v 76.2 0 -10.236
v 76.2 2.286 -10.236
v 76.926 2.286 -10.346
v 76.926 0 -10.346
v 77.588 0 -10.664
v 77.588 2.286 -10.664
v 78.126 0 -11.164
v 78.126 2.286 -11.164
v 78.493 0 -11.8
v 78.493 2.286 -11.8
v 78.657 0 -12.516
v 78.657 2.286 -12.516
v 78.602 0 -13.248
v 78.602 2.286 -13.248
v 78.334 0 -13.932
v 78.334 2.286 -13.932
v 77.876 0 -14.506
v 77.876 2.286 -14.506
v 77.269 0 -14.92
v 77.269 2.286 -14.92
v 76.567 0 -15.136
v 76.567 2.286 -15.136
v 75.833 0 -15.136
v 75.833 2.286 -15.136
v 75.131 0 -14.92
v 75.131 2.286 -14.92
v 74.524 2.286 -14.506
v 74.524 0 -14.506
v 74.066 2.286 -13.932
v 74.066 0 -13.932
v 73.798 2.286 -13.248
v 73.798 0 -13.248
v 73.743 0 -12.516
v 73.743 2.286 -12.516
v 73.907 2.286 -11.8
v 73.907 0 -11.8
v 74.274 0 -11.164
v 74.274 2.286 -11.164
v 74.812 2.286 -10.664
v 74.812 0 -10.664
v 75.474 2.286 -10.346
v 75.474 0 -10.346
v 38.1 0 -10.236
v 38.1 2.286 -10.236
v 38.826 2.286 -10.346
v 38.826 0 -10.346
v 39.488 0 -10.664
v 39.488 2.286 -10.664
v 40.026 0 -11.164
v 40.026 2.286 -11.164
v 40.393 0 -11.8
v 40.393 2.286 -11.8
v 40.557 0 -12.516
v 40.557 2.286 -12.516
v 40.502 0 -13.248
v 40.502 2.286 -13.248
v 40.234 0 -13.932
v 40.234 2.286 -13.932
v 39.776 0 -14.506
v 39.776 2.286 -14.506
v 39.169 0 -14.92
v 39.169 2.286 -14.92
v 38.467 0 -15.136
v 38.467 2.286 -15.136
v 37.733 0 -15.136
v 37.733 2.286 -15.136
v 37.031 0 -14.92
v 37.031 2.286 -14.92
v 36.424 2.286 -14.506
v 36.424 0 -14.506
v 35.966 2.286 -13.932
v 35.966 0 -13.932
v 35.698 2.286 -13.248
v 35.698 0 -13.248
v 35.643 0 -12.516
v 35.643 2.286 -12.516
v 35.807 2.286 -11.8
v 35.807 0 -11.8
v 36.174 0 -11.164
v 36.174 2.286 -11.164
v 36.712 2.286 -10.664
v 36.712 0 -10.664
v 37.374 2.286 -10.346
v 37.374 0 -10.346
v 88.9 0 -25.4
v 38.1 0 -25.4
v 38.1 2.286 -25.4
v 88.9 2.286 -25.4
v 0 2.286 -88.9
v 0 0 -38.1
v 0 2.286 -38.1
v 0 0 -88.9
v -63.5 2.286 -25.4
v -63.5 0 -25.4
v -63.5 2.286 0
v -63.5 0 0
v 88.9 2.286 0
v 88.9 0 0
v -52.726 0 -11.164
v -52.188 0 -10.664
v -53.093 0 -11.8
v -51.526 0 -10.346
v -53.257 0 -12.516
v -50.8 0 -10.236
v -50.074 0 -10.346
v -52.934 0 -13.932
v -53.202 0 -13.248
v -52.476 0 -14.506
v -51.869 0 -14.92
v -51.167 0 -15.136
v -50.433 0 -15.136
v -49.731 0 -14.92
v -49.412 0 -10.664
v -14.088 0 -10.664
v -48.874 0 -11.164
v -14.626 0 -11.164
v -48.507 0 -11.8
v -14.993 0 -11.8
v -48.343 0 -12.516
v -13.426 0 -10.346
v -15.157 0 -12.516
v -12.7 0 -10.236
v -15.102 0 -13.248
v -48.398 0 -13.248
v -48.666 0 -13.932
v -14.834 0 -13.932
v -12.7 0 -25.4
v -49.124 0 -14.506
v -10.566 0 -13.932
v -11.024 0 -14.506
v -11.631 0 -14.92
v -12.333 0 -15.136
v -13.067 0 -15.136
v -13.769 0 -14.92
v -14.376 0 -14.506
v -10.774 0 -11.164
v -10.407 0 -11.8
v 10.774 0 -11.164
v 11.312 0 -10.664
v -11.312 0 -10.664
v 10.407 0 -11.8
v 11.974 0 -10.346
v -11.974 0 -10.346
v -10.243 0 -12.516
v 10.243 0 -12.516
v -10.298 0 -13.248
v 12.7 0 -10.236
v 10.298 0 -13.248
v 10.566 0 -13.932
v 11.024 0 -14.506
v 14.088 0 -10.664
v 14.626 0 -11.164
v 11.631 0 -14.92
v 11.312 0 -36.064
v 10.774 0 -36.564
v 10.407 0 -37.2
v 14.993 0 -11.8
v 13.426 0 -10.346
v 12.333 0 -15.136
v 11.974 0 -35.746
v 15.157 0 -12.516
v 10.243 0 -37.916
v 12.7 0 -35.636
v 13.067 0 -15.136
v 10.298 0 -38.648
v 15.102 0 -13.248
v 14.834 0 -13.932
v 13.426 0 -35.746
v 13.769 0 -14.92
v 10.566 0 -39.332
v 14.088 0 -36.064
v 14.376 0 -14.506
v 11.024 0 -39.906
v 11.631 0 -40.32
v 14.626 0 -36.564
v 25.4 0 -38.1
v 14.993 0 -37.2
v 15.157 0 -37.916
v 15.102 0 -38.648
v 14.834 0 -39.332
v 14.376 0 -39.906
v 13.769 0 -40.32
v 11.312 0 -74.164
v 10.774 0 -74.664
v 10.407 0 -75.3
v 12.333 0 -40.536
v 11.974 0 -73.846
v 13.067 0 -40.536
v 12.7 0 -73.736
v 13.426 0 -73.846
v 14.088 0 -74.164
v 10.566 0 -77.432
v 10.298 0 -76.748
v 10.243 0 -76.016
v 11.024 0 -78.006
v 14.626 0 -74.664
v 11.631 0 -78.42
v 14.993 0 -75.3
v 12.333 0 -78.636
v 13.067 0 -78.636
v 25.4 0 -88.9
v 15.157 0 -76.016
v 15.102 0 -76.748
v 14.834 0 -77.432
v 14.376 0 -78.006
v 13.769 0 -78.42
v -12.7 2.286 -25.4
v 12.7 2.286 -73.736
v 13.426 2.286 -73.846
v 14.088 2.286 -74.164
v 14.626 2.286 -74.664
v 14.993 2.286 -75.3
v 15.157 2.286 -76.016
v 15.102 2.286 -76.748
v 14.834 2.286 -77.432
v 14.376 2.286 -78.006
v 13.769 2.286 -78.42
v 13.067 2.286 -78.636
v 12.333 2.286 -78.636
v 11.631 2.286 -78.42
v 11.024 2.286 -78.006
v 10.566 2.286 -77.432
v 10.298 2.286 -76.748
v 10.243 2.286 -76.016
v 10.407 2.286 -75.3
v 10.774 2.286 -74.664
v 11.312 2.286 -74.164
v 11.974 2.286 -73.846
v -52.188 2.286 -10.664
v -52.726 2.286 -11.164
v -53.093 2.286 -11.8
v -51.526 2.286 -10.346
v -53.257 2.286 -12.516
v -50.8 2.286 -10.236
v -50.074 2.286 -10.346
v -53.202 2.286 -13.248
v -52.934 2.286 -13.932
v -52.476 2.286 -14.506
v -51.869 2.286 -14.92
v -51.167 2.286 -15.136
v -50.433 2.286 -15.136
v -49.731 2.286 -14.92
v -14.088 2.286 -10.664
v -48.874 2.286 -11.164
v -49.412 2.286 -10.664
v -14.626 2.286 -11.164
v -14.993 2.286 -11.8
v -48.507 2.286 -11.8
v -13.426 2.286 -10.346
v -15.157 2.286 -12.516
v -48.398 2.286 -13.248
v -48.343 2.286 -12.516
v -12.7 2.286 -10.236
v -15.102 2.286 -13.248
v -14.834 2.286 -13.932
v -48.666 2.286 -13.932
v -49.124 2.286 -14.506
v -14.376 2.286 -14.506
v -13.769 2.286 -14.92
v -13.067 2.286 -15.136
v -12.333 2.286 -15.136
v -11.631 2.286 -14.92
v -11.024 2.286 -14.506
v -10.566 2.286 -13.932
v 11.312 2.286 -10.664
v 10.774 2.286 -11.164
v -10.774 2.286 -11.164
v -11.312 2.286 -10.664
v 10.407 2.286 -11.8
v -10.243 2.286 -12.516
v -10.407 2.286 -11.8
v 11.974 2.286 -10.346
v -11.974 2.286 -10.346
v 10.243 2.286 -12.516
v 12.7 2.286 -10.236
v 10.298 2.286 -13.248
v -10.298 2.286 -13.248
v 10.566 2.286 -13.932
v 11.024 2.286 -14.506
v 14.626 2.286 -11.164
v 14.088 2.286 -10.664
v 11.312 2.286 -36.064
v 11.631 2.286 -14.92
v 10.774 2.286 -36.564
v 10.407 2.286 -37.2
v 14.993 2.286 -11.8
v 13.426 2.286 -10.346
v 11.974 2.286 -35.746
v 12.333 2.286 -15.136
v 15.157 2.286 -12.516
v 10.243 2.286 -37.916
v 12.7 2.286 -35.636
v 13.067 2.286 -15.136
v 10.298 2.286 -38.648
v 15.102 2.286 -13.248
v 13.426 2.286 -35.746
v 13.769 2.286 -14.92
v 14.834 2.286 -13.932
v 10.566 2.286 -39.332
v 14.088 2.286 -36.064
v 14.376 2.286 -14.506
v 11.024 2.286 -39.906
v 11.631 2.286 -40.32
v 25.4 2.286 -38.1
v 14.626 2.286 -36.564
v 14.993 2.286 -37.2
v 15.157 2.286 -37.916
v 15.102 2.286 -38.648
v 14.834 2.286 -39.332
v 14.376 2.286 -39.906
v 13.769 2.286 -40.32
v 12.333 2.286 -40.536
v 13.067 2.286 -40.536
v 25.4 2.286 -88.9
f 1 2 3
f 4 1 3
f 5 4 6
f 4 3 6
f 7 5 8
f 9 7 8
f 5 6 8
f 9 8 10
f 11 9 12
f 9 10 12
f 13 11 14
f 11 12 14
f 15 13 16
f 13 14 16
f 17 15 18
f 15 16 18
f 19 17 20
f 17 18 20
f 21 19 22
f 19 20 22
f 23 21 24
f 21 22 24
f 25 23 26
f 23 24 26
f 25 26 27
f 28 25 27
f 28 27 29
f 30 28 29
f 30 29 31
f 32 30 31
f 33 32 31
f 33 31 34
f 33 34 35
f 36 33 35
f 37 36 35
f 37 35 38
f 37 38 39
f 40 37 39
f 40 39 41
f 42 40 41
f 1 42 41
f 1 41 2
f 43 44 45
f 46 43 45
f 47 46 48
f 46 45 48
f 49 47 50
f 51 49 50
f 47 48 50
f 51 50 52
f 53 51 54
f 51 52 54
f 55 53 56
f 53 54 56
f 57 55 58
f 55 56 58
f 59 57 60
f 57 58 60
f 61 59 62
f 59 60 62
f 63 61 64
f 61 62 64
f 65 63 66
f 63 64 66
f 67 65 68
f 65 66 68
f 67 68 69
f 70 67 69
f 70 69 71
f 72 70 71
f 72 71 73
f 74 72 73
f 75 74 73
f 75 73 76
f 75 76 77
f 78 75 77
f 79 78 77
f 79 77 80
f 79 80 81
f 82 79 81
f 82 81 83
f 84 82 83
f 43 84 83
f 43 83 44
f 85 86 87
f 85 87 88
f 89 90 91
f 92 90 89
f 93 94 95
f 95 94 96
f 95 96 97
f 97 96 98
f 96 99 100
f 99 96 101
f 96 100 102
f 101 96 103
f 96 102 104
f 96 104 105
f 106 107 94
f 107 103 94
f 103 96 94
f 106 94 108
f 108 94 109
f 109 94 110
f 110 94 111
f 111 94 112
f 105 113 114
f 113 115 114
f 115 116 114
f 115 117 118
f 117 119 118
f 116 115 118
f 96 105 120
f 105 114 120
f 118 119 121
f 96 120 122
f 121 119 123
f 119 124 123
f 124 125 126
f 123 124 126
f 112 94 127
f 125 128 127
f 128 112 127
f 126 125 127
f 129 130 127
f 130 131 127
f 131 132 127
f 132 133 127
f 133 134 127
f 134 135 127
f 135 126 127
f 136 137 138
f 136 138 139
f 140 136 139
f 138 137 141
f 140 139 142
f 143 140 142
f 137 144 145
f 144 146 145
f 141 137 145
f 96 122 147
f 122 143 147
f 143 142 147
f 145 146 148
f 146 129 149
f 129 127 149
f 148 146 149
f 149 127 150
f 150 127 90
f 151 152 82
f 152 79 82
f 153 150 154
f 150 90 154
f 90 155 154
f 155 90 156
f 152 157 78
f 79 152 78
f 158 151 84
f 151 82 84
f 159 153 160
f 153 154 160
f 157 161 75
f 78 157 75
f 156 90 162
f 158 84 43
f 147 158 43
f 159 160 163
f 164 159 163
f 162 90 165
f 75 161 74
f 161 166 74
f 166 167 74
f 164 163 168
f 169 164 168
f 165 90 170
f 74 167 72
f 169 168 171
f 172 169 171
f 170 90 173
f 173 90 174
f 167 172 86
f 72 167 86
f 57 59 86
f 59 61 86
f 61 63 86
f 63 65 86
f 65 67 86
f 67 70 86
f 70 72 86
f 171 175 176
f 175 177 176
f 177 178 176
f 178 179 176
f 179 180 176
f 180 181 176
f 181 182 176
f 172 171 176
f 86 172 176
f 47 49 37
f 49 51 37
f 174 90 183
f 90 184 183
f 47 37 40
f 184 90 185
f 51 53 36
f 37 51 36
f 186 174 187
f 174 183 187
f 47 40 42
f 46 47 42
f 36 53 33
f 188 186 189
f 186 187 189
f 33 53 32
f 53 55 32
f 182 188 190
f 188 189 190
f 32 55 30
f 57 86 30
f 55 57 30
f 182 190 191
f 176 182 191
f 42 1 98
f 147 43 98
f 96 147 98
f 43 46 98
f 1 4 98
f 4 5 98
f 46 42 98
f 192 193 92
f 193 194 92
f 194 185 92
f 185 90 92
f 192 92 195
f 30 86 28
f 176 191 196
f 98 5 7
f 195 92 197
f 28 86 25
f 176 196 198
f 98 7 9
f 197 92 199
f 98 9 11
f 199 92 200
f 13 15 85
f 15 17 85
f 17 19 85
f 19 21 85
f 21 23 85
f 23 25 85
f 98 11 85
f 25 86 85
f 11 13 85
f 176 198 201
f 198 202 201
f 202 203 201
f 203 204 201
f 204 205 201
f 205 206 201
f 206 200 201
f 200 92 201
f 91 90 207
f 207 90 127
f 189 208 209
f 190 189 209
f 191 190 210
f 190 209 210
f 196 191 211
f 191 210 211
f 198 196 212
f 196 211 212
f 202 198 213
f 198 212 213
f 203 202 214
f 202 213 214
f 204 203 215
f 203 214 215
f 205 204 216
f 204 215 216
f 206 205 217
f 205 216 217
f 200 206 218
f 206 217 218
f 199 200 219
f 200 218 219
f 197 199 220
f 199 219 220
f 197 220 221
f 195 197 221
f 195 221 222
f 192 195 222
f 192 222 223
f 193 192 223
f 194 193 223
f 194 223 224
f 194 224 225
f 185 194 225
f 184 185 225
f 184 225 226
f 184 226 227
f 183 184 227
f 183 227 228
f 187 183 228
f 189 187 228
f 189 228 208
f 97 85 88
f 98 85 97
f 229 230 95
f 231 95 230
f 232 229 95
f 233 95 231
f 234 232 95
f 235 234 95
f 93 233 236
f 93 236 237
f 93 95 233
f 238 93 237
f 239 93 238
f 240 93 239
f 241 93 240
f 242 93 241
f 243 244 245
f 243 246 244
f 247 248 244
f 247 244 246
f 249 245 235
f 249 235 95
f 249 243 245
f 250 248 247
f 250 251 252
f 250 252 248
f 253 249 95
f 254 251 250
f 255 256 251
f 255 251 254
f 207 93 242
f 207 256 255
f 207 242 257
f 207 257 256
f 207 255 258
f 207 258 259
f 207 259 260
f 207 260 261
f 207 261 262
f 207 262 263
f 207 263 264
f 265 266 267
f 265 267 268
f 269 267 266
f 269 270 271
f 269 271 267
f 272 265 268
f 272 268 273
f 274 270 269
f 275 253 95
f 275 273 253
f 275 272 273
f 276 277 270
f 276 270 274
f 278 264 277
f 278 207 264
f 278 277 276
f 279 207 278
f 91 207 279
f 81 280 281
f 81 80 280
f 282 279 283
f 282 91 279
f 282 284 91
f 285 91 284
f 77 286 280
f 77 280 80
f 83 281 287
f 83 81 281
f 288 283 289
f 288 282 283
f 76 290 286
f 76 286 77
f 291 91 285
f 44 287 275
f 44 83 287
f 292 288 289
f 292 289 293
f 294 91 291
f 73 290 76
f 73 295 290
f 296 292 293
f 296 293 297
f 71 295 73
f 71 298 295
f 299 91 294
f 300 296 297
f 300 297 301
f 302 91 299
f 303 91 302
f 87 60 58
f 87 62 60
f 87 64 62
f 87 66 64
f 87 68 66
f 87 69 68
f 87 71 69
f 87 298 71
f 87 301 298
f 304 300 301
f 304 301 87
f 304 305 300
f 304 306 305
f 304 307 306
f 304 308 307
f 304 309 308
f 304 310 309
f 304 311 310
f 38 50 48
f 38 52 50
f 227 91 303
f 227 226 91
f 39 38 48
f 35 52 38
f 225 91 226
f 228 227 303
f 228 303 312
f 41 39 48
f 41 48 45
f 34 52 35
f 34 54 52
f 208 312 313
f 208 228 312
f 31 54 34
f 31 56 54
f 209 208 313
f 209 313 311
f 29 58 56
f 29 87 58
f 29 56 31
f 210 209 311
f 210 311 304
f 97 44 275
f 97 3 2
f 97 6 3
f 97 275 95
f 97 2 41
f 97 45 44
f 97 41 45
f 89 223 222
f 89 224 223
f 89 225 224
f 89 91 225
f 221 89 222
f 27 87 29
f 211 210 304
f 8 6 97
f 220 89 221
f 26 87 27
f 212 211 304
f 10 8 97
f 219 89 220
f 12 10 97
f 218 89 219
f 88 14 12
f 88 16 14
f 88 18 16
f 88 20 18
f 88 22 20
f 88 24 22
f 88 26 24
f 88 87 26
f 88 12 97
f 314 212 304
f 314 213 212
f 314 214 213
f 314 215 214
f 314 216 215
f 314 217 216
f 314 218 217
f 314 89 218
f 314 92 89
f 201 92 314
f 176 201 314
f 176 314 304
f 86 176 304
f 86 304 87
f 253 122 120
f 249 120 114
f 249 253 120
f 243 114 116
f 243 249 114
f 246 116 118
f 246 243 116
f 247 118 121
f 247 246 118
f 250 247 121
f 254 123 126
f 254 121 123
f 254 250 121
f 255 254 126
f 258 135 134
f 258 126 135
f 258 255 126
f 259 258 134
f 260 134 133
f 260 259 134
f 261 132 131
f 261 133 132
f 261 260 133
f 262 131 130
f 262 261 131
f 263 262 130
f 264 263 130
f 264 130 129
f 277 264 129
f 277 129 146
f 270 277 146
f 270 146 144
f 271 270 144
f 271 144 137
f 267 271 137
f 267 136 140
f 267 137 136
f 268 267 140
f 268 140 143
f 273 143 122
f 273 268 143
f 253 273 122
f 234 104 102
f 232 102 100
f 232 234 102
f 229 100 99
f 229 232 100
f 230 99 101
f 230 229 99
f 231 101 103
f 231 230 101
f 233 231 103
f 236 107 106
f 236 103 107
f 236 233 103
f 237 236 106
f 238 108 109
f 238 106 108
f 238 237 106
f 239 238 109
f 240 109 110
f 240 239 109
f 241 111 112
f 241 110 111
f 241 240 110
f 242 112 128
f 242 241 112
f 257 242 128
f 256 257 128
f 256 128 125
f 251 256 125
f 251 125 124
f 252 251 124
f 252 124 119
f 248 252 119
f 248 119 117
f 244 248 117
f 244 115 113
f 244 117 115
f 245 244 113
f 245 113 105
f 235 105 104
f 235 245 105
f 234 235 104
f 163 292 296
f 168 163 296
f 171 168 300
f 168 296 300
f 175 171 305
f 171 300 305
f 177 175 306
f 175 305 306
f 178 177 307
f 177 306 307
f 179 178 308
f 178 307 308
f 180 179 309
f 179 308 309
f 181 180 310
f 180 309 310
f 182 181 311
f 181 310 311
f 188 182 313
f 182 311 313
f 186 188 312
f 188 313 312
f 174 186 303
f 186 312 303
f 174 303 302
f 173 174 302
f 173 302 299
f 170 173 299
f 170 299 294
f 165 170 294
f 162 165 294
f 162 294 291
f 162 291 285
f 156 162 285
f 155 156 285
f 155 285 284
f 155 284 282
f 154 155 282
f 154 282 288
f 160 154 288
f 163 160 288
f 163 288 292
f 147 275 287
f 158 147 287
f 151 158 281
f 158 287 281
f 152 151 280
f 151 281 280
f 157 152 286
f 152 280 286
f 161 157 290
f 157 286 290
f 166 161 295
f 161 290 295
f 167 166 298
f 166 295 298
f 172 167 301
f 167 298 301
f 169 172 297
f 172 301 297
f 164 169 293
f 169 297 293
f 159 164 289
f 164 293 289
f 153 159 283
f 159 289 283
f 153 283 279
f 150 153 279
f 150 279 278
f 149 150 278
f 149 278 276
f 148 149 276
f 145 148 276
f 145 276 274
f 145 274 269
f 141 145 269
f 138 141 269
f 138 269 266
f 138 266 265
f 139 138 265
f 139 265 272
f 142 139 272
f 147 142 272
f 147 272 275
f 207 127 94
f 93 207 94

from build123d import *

# Parameters (mm, degrees)
BOSS_EXTRUDE1_DEPTH = 2.286
SKETCH3_R           = 2.4638
CUT_EXTRUDE2_DEPTH  = 126.744366856


with BuildPart() as part:
    # Sketch1 → Boss-Extrude1 (new body)
    with BuildSketch(Plane(origin=(0, 0, 0), x_dir=(1, 0, 0), z_dir=(0, 1, 0))):
        Polygon((25.4, 38.1), (38.1, 25.4), (88.9, 25.4), (88.9, 0), (0, 0), (0, 88.9), (25.4, 88.9), align=None)
    boss_extrude1 = extrude(amount=BOSS_EXTRUDE1_DEPTH)

    # Mirror1: Boss-Extrude1 across plane
    add(boss_extrude1.mirror(Plane.ZY.offset(-12.7)))

    # Sketch3 → Cut-Extrude2 (cut, through all)
    with BuildSketch(Plane(origin=(0, 2.286, 0), x_dir=(1, 0, 0), z_dir=(0, 1, 0))):
        with Locations(Location((76.2, 12.7, 0), (0, 0, 270))):
            Circle(SKETCH3_R)
        with Locations(Location((12.7, 12.7, 0), (0, 0, 270))):
            Circle(SKETCH3_R)
        with Locations(Location((12.7, 76.2, 0), (0, 0, 270))):
            Circle(SKETCH3_R)
        with Locations(Location((12.7, 38.1, 0), (0, 0, 270))):
            Circle(SKETCH3_R)
        with Locations(Location((38.1, 12.7, 0), (0, 0, 270))):
            Circle(SKETCH3_R)
    cut_extrude2 = extrude(amount=-CUT_EXTRUDE2_DEPTH, mode=Mode.SUBTRACT)

    # Mirror2: Cut-Extrude2 across plane
    add(cut_extrude2.mirror(Plane.ZY.offset(-12.7)), mode=Mode.SUBTRACT)


solid = part.part
